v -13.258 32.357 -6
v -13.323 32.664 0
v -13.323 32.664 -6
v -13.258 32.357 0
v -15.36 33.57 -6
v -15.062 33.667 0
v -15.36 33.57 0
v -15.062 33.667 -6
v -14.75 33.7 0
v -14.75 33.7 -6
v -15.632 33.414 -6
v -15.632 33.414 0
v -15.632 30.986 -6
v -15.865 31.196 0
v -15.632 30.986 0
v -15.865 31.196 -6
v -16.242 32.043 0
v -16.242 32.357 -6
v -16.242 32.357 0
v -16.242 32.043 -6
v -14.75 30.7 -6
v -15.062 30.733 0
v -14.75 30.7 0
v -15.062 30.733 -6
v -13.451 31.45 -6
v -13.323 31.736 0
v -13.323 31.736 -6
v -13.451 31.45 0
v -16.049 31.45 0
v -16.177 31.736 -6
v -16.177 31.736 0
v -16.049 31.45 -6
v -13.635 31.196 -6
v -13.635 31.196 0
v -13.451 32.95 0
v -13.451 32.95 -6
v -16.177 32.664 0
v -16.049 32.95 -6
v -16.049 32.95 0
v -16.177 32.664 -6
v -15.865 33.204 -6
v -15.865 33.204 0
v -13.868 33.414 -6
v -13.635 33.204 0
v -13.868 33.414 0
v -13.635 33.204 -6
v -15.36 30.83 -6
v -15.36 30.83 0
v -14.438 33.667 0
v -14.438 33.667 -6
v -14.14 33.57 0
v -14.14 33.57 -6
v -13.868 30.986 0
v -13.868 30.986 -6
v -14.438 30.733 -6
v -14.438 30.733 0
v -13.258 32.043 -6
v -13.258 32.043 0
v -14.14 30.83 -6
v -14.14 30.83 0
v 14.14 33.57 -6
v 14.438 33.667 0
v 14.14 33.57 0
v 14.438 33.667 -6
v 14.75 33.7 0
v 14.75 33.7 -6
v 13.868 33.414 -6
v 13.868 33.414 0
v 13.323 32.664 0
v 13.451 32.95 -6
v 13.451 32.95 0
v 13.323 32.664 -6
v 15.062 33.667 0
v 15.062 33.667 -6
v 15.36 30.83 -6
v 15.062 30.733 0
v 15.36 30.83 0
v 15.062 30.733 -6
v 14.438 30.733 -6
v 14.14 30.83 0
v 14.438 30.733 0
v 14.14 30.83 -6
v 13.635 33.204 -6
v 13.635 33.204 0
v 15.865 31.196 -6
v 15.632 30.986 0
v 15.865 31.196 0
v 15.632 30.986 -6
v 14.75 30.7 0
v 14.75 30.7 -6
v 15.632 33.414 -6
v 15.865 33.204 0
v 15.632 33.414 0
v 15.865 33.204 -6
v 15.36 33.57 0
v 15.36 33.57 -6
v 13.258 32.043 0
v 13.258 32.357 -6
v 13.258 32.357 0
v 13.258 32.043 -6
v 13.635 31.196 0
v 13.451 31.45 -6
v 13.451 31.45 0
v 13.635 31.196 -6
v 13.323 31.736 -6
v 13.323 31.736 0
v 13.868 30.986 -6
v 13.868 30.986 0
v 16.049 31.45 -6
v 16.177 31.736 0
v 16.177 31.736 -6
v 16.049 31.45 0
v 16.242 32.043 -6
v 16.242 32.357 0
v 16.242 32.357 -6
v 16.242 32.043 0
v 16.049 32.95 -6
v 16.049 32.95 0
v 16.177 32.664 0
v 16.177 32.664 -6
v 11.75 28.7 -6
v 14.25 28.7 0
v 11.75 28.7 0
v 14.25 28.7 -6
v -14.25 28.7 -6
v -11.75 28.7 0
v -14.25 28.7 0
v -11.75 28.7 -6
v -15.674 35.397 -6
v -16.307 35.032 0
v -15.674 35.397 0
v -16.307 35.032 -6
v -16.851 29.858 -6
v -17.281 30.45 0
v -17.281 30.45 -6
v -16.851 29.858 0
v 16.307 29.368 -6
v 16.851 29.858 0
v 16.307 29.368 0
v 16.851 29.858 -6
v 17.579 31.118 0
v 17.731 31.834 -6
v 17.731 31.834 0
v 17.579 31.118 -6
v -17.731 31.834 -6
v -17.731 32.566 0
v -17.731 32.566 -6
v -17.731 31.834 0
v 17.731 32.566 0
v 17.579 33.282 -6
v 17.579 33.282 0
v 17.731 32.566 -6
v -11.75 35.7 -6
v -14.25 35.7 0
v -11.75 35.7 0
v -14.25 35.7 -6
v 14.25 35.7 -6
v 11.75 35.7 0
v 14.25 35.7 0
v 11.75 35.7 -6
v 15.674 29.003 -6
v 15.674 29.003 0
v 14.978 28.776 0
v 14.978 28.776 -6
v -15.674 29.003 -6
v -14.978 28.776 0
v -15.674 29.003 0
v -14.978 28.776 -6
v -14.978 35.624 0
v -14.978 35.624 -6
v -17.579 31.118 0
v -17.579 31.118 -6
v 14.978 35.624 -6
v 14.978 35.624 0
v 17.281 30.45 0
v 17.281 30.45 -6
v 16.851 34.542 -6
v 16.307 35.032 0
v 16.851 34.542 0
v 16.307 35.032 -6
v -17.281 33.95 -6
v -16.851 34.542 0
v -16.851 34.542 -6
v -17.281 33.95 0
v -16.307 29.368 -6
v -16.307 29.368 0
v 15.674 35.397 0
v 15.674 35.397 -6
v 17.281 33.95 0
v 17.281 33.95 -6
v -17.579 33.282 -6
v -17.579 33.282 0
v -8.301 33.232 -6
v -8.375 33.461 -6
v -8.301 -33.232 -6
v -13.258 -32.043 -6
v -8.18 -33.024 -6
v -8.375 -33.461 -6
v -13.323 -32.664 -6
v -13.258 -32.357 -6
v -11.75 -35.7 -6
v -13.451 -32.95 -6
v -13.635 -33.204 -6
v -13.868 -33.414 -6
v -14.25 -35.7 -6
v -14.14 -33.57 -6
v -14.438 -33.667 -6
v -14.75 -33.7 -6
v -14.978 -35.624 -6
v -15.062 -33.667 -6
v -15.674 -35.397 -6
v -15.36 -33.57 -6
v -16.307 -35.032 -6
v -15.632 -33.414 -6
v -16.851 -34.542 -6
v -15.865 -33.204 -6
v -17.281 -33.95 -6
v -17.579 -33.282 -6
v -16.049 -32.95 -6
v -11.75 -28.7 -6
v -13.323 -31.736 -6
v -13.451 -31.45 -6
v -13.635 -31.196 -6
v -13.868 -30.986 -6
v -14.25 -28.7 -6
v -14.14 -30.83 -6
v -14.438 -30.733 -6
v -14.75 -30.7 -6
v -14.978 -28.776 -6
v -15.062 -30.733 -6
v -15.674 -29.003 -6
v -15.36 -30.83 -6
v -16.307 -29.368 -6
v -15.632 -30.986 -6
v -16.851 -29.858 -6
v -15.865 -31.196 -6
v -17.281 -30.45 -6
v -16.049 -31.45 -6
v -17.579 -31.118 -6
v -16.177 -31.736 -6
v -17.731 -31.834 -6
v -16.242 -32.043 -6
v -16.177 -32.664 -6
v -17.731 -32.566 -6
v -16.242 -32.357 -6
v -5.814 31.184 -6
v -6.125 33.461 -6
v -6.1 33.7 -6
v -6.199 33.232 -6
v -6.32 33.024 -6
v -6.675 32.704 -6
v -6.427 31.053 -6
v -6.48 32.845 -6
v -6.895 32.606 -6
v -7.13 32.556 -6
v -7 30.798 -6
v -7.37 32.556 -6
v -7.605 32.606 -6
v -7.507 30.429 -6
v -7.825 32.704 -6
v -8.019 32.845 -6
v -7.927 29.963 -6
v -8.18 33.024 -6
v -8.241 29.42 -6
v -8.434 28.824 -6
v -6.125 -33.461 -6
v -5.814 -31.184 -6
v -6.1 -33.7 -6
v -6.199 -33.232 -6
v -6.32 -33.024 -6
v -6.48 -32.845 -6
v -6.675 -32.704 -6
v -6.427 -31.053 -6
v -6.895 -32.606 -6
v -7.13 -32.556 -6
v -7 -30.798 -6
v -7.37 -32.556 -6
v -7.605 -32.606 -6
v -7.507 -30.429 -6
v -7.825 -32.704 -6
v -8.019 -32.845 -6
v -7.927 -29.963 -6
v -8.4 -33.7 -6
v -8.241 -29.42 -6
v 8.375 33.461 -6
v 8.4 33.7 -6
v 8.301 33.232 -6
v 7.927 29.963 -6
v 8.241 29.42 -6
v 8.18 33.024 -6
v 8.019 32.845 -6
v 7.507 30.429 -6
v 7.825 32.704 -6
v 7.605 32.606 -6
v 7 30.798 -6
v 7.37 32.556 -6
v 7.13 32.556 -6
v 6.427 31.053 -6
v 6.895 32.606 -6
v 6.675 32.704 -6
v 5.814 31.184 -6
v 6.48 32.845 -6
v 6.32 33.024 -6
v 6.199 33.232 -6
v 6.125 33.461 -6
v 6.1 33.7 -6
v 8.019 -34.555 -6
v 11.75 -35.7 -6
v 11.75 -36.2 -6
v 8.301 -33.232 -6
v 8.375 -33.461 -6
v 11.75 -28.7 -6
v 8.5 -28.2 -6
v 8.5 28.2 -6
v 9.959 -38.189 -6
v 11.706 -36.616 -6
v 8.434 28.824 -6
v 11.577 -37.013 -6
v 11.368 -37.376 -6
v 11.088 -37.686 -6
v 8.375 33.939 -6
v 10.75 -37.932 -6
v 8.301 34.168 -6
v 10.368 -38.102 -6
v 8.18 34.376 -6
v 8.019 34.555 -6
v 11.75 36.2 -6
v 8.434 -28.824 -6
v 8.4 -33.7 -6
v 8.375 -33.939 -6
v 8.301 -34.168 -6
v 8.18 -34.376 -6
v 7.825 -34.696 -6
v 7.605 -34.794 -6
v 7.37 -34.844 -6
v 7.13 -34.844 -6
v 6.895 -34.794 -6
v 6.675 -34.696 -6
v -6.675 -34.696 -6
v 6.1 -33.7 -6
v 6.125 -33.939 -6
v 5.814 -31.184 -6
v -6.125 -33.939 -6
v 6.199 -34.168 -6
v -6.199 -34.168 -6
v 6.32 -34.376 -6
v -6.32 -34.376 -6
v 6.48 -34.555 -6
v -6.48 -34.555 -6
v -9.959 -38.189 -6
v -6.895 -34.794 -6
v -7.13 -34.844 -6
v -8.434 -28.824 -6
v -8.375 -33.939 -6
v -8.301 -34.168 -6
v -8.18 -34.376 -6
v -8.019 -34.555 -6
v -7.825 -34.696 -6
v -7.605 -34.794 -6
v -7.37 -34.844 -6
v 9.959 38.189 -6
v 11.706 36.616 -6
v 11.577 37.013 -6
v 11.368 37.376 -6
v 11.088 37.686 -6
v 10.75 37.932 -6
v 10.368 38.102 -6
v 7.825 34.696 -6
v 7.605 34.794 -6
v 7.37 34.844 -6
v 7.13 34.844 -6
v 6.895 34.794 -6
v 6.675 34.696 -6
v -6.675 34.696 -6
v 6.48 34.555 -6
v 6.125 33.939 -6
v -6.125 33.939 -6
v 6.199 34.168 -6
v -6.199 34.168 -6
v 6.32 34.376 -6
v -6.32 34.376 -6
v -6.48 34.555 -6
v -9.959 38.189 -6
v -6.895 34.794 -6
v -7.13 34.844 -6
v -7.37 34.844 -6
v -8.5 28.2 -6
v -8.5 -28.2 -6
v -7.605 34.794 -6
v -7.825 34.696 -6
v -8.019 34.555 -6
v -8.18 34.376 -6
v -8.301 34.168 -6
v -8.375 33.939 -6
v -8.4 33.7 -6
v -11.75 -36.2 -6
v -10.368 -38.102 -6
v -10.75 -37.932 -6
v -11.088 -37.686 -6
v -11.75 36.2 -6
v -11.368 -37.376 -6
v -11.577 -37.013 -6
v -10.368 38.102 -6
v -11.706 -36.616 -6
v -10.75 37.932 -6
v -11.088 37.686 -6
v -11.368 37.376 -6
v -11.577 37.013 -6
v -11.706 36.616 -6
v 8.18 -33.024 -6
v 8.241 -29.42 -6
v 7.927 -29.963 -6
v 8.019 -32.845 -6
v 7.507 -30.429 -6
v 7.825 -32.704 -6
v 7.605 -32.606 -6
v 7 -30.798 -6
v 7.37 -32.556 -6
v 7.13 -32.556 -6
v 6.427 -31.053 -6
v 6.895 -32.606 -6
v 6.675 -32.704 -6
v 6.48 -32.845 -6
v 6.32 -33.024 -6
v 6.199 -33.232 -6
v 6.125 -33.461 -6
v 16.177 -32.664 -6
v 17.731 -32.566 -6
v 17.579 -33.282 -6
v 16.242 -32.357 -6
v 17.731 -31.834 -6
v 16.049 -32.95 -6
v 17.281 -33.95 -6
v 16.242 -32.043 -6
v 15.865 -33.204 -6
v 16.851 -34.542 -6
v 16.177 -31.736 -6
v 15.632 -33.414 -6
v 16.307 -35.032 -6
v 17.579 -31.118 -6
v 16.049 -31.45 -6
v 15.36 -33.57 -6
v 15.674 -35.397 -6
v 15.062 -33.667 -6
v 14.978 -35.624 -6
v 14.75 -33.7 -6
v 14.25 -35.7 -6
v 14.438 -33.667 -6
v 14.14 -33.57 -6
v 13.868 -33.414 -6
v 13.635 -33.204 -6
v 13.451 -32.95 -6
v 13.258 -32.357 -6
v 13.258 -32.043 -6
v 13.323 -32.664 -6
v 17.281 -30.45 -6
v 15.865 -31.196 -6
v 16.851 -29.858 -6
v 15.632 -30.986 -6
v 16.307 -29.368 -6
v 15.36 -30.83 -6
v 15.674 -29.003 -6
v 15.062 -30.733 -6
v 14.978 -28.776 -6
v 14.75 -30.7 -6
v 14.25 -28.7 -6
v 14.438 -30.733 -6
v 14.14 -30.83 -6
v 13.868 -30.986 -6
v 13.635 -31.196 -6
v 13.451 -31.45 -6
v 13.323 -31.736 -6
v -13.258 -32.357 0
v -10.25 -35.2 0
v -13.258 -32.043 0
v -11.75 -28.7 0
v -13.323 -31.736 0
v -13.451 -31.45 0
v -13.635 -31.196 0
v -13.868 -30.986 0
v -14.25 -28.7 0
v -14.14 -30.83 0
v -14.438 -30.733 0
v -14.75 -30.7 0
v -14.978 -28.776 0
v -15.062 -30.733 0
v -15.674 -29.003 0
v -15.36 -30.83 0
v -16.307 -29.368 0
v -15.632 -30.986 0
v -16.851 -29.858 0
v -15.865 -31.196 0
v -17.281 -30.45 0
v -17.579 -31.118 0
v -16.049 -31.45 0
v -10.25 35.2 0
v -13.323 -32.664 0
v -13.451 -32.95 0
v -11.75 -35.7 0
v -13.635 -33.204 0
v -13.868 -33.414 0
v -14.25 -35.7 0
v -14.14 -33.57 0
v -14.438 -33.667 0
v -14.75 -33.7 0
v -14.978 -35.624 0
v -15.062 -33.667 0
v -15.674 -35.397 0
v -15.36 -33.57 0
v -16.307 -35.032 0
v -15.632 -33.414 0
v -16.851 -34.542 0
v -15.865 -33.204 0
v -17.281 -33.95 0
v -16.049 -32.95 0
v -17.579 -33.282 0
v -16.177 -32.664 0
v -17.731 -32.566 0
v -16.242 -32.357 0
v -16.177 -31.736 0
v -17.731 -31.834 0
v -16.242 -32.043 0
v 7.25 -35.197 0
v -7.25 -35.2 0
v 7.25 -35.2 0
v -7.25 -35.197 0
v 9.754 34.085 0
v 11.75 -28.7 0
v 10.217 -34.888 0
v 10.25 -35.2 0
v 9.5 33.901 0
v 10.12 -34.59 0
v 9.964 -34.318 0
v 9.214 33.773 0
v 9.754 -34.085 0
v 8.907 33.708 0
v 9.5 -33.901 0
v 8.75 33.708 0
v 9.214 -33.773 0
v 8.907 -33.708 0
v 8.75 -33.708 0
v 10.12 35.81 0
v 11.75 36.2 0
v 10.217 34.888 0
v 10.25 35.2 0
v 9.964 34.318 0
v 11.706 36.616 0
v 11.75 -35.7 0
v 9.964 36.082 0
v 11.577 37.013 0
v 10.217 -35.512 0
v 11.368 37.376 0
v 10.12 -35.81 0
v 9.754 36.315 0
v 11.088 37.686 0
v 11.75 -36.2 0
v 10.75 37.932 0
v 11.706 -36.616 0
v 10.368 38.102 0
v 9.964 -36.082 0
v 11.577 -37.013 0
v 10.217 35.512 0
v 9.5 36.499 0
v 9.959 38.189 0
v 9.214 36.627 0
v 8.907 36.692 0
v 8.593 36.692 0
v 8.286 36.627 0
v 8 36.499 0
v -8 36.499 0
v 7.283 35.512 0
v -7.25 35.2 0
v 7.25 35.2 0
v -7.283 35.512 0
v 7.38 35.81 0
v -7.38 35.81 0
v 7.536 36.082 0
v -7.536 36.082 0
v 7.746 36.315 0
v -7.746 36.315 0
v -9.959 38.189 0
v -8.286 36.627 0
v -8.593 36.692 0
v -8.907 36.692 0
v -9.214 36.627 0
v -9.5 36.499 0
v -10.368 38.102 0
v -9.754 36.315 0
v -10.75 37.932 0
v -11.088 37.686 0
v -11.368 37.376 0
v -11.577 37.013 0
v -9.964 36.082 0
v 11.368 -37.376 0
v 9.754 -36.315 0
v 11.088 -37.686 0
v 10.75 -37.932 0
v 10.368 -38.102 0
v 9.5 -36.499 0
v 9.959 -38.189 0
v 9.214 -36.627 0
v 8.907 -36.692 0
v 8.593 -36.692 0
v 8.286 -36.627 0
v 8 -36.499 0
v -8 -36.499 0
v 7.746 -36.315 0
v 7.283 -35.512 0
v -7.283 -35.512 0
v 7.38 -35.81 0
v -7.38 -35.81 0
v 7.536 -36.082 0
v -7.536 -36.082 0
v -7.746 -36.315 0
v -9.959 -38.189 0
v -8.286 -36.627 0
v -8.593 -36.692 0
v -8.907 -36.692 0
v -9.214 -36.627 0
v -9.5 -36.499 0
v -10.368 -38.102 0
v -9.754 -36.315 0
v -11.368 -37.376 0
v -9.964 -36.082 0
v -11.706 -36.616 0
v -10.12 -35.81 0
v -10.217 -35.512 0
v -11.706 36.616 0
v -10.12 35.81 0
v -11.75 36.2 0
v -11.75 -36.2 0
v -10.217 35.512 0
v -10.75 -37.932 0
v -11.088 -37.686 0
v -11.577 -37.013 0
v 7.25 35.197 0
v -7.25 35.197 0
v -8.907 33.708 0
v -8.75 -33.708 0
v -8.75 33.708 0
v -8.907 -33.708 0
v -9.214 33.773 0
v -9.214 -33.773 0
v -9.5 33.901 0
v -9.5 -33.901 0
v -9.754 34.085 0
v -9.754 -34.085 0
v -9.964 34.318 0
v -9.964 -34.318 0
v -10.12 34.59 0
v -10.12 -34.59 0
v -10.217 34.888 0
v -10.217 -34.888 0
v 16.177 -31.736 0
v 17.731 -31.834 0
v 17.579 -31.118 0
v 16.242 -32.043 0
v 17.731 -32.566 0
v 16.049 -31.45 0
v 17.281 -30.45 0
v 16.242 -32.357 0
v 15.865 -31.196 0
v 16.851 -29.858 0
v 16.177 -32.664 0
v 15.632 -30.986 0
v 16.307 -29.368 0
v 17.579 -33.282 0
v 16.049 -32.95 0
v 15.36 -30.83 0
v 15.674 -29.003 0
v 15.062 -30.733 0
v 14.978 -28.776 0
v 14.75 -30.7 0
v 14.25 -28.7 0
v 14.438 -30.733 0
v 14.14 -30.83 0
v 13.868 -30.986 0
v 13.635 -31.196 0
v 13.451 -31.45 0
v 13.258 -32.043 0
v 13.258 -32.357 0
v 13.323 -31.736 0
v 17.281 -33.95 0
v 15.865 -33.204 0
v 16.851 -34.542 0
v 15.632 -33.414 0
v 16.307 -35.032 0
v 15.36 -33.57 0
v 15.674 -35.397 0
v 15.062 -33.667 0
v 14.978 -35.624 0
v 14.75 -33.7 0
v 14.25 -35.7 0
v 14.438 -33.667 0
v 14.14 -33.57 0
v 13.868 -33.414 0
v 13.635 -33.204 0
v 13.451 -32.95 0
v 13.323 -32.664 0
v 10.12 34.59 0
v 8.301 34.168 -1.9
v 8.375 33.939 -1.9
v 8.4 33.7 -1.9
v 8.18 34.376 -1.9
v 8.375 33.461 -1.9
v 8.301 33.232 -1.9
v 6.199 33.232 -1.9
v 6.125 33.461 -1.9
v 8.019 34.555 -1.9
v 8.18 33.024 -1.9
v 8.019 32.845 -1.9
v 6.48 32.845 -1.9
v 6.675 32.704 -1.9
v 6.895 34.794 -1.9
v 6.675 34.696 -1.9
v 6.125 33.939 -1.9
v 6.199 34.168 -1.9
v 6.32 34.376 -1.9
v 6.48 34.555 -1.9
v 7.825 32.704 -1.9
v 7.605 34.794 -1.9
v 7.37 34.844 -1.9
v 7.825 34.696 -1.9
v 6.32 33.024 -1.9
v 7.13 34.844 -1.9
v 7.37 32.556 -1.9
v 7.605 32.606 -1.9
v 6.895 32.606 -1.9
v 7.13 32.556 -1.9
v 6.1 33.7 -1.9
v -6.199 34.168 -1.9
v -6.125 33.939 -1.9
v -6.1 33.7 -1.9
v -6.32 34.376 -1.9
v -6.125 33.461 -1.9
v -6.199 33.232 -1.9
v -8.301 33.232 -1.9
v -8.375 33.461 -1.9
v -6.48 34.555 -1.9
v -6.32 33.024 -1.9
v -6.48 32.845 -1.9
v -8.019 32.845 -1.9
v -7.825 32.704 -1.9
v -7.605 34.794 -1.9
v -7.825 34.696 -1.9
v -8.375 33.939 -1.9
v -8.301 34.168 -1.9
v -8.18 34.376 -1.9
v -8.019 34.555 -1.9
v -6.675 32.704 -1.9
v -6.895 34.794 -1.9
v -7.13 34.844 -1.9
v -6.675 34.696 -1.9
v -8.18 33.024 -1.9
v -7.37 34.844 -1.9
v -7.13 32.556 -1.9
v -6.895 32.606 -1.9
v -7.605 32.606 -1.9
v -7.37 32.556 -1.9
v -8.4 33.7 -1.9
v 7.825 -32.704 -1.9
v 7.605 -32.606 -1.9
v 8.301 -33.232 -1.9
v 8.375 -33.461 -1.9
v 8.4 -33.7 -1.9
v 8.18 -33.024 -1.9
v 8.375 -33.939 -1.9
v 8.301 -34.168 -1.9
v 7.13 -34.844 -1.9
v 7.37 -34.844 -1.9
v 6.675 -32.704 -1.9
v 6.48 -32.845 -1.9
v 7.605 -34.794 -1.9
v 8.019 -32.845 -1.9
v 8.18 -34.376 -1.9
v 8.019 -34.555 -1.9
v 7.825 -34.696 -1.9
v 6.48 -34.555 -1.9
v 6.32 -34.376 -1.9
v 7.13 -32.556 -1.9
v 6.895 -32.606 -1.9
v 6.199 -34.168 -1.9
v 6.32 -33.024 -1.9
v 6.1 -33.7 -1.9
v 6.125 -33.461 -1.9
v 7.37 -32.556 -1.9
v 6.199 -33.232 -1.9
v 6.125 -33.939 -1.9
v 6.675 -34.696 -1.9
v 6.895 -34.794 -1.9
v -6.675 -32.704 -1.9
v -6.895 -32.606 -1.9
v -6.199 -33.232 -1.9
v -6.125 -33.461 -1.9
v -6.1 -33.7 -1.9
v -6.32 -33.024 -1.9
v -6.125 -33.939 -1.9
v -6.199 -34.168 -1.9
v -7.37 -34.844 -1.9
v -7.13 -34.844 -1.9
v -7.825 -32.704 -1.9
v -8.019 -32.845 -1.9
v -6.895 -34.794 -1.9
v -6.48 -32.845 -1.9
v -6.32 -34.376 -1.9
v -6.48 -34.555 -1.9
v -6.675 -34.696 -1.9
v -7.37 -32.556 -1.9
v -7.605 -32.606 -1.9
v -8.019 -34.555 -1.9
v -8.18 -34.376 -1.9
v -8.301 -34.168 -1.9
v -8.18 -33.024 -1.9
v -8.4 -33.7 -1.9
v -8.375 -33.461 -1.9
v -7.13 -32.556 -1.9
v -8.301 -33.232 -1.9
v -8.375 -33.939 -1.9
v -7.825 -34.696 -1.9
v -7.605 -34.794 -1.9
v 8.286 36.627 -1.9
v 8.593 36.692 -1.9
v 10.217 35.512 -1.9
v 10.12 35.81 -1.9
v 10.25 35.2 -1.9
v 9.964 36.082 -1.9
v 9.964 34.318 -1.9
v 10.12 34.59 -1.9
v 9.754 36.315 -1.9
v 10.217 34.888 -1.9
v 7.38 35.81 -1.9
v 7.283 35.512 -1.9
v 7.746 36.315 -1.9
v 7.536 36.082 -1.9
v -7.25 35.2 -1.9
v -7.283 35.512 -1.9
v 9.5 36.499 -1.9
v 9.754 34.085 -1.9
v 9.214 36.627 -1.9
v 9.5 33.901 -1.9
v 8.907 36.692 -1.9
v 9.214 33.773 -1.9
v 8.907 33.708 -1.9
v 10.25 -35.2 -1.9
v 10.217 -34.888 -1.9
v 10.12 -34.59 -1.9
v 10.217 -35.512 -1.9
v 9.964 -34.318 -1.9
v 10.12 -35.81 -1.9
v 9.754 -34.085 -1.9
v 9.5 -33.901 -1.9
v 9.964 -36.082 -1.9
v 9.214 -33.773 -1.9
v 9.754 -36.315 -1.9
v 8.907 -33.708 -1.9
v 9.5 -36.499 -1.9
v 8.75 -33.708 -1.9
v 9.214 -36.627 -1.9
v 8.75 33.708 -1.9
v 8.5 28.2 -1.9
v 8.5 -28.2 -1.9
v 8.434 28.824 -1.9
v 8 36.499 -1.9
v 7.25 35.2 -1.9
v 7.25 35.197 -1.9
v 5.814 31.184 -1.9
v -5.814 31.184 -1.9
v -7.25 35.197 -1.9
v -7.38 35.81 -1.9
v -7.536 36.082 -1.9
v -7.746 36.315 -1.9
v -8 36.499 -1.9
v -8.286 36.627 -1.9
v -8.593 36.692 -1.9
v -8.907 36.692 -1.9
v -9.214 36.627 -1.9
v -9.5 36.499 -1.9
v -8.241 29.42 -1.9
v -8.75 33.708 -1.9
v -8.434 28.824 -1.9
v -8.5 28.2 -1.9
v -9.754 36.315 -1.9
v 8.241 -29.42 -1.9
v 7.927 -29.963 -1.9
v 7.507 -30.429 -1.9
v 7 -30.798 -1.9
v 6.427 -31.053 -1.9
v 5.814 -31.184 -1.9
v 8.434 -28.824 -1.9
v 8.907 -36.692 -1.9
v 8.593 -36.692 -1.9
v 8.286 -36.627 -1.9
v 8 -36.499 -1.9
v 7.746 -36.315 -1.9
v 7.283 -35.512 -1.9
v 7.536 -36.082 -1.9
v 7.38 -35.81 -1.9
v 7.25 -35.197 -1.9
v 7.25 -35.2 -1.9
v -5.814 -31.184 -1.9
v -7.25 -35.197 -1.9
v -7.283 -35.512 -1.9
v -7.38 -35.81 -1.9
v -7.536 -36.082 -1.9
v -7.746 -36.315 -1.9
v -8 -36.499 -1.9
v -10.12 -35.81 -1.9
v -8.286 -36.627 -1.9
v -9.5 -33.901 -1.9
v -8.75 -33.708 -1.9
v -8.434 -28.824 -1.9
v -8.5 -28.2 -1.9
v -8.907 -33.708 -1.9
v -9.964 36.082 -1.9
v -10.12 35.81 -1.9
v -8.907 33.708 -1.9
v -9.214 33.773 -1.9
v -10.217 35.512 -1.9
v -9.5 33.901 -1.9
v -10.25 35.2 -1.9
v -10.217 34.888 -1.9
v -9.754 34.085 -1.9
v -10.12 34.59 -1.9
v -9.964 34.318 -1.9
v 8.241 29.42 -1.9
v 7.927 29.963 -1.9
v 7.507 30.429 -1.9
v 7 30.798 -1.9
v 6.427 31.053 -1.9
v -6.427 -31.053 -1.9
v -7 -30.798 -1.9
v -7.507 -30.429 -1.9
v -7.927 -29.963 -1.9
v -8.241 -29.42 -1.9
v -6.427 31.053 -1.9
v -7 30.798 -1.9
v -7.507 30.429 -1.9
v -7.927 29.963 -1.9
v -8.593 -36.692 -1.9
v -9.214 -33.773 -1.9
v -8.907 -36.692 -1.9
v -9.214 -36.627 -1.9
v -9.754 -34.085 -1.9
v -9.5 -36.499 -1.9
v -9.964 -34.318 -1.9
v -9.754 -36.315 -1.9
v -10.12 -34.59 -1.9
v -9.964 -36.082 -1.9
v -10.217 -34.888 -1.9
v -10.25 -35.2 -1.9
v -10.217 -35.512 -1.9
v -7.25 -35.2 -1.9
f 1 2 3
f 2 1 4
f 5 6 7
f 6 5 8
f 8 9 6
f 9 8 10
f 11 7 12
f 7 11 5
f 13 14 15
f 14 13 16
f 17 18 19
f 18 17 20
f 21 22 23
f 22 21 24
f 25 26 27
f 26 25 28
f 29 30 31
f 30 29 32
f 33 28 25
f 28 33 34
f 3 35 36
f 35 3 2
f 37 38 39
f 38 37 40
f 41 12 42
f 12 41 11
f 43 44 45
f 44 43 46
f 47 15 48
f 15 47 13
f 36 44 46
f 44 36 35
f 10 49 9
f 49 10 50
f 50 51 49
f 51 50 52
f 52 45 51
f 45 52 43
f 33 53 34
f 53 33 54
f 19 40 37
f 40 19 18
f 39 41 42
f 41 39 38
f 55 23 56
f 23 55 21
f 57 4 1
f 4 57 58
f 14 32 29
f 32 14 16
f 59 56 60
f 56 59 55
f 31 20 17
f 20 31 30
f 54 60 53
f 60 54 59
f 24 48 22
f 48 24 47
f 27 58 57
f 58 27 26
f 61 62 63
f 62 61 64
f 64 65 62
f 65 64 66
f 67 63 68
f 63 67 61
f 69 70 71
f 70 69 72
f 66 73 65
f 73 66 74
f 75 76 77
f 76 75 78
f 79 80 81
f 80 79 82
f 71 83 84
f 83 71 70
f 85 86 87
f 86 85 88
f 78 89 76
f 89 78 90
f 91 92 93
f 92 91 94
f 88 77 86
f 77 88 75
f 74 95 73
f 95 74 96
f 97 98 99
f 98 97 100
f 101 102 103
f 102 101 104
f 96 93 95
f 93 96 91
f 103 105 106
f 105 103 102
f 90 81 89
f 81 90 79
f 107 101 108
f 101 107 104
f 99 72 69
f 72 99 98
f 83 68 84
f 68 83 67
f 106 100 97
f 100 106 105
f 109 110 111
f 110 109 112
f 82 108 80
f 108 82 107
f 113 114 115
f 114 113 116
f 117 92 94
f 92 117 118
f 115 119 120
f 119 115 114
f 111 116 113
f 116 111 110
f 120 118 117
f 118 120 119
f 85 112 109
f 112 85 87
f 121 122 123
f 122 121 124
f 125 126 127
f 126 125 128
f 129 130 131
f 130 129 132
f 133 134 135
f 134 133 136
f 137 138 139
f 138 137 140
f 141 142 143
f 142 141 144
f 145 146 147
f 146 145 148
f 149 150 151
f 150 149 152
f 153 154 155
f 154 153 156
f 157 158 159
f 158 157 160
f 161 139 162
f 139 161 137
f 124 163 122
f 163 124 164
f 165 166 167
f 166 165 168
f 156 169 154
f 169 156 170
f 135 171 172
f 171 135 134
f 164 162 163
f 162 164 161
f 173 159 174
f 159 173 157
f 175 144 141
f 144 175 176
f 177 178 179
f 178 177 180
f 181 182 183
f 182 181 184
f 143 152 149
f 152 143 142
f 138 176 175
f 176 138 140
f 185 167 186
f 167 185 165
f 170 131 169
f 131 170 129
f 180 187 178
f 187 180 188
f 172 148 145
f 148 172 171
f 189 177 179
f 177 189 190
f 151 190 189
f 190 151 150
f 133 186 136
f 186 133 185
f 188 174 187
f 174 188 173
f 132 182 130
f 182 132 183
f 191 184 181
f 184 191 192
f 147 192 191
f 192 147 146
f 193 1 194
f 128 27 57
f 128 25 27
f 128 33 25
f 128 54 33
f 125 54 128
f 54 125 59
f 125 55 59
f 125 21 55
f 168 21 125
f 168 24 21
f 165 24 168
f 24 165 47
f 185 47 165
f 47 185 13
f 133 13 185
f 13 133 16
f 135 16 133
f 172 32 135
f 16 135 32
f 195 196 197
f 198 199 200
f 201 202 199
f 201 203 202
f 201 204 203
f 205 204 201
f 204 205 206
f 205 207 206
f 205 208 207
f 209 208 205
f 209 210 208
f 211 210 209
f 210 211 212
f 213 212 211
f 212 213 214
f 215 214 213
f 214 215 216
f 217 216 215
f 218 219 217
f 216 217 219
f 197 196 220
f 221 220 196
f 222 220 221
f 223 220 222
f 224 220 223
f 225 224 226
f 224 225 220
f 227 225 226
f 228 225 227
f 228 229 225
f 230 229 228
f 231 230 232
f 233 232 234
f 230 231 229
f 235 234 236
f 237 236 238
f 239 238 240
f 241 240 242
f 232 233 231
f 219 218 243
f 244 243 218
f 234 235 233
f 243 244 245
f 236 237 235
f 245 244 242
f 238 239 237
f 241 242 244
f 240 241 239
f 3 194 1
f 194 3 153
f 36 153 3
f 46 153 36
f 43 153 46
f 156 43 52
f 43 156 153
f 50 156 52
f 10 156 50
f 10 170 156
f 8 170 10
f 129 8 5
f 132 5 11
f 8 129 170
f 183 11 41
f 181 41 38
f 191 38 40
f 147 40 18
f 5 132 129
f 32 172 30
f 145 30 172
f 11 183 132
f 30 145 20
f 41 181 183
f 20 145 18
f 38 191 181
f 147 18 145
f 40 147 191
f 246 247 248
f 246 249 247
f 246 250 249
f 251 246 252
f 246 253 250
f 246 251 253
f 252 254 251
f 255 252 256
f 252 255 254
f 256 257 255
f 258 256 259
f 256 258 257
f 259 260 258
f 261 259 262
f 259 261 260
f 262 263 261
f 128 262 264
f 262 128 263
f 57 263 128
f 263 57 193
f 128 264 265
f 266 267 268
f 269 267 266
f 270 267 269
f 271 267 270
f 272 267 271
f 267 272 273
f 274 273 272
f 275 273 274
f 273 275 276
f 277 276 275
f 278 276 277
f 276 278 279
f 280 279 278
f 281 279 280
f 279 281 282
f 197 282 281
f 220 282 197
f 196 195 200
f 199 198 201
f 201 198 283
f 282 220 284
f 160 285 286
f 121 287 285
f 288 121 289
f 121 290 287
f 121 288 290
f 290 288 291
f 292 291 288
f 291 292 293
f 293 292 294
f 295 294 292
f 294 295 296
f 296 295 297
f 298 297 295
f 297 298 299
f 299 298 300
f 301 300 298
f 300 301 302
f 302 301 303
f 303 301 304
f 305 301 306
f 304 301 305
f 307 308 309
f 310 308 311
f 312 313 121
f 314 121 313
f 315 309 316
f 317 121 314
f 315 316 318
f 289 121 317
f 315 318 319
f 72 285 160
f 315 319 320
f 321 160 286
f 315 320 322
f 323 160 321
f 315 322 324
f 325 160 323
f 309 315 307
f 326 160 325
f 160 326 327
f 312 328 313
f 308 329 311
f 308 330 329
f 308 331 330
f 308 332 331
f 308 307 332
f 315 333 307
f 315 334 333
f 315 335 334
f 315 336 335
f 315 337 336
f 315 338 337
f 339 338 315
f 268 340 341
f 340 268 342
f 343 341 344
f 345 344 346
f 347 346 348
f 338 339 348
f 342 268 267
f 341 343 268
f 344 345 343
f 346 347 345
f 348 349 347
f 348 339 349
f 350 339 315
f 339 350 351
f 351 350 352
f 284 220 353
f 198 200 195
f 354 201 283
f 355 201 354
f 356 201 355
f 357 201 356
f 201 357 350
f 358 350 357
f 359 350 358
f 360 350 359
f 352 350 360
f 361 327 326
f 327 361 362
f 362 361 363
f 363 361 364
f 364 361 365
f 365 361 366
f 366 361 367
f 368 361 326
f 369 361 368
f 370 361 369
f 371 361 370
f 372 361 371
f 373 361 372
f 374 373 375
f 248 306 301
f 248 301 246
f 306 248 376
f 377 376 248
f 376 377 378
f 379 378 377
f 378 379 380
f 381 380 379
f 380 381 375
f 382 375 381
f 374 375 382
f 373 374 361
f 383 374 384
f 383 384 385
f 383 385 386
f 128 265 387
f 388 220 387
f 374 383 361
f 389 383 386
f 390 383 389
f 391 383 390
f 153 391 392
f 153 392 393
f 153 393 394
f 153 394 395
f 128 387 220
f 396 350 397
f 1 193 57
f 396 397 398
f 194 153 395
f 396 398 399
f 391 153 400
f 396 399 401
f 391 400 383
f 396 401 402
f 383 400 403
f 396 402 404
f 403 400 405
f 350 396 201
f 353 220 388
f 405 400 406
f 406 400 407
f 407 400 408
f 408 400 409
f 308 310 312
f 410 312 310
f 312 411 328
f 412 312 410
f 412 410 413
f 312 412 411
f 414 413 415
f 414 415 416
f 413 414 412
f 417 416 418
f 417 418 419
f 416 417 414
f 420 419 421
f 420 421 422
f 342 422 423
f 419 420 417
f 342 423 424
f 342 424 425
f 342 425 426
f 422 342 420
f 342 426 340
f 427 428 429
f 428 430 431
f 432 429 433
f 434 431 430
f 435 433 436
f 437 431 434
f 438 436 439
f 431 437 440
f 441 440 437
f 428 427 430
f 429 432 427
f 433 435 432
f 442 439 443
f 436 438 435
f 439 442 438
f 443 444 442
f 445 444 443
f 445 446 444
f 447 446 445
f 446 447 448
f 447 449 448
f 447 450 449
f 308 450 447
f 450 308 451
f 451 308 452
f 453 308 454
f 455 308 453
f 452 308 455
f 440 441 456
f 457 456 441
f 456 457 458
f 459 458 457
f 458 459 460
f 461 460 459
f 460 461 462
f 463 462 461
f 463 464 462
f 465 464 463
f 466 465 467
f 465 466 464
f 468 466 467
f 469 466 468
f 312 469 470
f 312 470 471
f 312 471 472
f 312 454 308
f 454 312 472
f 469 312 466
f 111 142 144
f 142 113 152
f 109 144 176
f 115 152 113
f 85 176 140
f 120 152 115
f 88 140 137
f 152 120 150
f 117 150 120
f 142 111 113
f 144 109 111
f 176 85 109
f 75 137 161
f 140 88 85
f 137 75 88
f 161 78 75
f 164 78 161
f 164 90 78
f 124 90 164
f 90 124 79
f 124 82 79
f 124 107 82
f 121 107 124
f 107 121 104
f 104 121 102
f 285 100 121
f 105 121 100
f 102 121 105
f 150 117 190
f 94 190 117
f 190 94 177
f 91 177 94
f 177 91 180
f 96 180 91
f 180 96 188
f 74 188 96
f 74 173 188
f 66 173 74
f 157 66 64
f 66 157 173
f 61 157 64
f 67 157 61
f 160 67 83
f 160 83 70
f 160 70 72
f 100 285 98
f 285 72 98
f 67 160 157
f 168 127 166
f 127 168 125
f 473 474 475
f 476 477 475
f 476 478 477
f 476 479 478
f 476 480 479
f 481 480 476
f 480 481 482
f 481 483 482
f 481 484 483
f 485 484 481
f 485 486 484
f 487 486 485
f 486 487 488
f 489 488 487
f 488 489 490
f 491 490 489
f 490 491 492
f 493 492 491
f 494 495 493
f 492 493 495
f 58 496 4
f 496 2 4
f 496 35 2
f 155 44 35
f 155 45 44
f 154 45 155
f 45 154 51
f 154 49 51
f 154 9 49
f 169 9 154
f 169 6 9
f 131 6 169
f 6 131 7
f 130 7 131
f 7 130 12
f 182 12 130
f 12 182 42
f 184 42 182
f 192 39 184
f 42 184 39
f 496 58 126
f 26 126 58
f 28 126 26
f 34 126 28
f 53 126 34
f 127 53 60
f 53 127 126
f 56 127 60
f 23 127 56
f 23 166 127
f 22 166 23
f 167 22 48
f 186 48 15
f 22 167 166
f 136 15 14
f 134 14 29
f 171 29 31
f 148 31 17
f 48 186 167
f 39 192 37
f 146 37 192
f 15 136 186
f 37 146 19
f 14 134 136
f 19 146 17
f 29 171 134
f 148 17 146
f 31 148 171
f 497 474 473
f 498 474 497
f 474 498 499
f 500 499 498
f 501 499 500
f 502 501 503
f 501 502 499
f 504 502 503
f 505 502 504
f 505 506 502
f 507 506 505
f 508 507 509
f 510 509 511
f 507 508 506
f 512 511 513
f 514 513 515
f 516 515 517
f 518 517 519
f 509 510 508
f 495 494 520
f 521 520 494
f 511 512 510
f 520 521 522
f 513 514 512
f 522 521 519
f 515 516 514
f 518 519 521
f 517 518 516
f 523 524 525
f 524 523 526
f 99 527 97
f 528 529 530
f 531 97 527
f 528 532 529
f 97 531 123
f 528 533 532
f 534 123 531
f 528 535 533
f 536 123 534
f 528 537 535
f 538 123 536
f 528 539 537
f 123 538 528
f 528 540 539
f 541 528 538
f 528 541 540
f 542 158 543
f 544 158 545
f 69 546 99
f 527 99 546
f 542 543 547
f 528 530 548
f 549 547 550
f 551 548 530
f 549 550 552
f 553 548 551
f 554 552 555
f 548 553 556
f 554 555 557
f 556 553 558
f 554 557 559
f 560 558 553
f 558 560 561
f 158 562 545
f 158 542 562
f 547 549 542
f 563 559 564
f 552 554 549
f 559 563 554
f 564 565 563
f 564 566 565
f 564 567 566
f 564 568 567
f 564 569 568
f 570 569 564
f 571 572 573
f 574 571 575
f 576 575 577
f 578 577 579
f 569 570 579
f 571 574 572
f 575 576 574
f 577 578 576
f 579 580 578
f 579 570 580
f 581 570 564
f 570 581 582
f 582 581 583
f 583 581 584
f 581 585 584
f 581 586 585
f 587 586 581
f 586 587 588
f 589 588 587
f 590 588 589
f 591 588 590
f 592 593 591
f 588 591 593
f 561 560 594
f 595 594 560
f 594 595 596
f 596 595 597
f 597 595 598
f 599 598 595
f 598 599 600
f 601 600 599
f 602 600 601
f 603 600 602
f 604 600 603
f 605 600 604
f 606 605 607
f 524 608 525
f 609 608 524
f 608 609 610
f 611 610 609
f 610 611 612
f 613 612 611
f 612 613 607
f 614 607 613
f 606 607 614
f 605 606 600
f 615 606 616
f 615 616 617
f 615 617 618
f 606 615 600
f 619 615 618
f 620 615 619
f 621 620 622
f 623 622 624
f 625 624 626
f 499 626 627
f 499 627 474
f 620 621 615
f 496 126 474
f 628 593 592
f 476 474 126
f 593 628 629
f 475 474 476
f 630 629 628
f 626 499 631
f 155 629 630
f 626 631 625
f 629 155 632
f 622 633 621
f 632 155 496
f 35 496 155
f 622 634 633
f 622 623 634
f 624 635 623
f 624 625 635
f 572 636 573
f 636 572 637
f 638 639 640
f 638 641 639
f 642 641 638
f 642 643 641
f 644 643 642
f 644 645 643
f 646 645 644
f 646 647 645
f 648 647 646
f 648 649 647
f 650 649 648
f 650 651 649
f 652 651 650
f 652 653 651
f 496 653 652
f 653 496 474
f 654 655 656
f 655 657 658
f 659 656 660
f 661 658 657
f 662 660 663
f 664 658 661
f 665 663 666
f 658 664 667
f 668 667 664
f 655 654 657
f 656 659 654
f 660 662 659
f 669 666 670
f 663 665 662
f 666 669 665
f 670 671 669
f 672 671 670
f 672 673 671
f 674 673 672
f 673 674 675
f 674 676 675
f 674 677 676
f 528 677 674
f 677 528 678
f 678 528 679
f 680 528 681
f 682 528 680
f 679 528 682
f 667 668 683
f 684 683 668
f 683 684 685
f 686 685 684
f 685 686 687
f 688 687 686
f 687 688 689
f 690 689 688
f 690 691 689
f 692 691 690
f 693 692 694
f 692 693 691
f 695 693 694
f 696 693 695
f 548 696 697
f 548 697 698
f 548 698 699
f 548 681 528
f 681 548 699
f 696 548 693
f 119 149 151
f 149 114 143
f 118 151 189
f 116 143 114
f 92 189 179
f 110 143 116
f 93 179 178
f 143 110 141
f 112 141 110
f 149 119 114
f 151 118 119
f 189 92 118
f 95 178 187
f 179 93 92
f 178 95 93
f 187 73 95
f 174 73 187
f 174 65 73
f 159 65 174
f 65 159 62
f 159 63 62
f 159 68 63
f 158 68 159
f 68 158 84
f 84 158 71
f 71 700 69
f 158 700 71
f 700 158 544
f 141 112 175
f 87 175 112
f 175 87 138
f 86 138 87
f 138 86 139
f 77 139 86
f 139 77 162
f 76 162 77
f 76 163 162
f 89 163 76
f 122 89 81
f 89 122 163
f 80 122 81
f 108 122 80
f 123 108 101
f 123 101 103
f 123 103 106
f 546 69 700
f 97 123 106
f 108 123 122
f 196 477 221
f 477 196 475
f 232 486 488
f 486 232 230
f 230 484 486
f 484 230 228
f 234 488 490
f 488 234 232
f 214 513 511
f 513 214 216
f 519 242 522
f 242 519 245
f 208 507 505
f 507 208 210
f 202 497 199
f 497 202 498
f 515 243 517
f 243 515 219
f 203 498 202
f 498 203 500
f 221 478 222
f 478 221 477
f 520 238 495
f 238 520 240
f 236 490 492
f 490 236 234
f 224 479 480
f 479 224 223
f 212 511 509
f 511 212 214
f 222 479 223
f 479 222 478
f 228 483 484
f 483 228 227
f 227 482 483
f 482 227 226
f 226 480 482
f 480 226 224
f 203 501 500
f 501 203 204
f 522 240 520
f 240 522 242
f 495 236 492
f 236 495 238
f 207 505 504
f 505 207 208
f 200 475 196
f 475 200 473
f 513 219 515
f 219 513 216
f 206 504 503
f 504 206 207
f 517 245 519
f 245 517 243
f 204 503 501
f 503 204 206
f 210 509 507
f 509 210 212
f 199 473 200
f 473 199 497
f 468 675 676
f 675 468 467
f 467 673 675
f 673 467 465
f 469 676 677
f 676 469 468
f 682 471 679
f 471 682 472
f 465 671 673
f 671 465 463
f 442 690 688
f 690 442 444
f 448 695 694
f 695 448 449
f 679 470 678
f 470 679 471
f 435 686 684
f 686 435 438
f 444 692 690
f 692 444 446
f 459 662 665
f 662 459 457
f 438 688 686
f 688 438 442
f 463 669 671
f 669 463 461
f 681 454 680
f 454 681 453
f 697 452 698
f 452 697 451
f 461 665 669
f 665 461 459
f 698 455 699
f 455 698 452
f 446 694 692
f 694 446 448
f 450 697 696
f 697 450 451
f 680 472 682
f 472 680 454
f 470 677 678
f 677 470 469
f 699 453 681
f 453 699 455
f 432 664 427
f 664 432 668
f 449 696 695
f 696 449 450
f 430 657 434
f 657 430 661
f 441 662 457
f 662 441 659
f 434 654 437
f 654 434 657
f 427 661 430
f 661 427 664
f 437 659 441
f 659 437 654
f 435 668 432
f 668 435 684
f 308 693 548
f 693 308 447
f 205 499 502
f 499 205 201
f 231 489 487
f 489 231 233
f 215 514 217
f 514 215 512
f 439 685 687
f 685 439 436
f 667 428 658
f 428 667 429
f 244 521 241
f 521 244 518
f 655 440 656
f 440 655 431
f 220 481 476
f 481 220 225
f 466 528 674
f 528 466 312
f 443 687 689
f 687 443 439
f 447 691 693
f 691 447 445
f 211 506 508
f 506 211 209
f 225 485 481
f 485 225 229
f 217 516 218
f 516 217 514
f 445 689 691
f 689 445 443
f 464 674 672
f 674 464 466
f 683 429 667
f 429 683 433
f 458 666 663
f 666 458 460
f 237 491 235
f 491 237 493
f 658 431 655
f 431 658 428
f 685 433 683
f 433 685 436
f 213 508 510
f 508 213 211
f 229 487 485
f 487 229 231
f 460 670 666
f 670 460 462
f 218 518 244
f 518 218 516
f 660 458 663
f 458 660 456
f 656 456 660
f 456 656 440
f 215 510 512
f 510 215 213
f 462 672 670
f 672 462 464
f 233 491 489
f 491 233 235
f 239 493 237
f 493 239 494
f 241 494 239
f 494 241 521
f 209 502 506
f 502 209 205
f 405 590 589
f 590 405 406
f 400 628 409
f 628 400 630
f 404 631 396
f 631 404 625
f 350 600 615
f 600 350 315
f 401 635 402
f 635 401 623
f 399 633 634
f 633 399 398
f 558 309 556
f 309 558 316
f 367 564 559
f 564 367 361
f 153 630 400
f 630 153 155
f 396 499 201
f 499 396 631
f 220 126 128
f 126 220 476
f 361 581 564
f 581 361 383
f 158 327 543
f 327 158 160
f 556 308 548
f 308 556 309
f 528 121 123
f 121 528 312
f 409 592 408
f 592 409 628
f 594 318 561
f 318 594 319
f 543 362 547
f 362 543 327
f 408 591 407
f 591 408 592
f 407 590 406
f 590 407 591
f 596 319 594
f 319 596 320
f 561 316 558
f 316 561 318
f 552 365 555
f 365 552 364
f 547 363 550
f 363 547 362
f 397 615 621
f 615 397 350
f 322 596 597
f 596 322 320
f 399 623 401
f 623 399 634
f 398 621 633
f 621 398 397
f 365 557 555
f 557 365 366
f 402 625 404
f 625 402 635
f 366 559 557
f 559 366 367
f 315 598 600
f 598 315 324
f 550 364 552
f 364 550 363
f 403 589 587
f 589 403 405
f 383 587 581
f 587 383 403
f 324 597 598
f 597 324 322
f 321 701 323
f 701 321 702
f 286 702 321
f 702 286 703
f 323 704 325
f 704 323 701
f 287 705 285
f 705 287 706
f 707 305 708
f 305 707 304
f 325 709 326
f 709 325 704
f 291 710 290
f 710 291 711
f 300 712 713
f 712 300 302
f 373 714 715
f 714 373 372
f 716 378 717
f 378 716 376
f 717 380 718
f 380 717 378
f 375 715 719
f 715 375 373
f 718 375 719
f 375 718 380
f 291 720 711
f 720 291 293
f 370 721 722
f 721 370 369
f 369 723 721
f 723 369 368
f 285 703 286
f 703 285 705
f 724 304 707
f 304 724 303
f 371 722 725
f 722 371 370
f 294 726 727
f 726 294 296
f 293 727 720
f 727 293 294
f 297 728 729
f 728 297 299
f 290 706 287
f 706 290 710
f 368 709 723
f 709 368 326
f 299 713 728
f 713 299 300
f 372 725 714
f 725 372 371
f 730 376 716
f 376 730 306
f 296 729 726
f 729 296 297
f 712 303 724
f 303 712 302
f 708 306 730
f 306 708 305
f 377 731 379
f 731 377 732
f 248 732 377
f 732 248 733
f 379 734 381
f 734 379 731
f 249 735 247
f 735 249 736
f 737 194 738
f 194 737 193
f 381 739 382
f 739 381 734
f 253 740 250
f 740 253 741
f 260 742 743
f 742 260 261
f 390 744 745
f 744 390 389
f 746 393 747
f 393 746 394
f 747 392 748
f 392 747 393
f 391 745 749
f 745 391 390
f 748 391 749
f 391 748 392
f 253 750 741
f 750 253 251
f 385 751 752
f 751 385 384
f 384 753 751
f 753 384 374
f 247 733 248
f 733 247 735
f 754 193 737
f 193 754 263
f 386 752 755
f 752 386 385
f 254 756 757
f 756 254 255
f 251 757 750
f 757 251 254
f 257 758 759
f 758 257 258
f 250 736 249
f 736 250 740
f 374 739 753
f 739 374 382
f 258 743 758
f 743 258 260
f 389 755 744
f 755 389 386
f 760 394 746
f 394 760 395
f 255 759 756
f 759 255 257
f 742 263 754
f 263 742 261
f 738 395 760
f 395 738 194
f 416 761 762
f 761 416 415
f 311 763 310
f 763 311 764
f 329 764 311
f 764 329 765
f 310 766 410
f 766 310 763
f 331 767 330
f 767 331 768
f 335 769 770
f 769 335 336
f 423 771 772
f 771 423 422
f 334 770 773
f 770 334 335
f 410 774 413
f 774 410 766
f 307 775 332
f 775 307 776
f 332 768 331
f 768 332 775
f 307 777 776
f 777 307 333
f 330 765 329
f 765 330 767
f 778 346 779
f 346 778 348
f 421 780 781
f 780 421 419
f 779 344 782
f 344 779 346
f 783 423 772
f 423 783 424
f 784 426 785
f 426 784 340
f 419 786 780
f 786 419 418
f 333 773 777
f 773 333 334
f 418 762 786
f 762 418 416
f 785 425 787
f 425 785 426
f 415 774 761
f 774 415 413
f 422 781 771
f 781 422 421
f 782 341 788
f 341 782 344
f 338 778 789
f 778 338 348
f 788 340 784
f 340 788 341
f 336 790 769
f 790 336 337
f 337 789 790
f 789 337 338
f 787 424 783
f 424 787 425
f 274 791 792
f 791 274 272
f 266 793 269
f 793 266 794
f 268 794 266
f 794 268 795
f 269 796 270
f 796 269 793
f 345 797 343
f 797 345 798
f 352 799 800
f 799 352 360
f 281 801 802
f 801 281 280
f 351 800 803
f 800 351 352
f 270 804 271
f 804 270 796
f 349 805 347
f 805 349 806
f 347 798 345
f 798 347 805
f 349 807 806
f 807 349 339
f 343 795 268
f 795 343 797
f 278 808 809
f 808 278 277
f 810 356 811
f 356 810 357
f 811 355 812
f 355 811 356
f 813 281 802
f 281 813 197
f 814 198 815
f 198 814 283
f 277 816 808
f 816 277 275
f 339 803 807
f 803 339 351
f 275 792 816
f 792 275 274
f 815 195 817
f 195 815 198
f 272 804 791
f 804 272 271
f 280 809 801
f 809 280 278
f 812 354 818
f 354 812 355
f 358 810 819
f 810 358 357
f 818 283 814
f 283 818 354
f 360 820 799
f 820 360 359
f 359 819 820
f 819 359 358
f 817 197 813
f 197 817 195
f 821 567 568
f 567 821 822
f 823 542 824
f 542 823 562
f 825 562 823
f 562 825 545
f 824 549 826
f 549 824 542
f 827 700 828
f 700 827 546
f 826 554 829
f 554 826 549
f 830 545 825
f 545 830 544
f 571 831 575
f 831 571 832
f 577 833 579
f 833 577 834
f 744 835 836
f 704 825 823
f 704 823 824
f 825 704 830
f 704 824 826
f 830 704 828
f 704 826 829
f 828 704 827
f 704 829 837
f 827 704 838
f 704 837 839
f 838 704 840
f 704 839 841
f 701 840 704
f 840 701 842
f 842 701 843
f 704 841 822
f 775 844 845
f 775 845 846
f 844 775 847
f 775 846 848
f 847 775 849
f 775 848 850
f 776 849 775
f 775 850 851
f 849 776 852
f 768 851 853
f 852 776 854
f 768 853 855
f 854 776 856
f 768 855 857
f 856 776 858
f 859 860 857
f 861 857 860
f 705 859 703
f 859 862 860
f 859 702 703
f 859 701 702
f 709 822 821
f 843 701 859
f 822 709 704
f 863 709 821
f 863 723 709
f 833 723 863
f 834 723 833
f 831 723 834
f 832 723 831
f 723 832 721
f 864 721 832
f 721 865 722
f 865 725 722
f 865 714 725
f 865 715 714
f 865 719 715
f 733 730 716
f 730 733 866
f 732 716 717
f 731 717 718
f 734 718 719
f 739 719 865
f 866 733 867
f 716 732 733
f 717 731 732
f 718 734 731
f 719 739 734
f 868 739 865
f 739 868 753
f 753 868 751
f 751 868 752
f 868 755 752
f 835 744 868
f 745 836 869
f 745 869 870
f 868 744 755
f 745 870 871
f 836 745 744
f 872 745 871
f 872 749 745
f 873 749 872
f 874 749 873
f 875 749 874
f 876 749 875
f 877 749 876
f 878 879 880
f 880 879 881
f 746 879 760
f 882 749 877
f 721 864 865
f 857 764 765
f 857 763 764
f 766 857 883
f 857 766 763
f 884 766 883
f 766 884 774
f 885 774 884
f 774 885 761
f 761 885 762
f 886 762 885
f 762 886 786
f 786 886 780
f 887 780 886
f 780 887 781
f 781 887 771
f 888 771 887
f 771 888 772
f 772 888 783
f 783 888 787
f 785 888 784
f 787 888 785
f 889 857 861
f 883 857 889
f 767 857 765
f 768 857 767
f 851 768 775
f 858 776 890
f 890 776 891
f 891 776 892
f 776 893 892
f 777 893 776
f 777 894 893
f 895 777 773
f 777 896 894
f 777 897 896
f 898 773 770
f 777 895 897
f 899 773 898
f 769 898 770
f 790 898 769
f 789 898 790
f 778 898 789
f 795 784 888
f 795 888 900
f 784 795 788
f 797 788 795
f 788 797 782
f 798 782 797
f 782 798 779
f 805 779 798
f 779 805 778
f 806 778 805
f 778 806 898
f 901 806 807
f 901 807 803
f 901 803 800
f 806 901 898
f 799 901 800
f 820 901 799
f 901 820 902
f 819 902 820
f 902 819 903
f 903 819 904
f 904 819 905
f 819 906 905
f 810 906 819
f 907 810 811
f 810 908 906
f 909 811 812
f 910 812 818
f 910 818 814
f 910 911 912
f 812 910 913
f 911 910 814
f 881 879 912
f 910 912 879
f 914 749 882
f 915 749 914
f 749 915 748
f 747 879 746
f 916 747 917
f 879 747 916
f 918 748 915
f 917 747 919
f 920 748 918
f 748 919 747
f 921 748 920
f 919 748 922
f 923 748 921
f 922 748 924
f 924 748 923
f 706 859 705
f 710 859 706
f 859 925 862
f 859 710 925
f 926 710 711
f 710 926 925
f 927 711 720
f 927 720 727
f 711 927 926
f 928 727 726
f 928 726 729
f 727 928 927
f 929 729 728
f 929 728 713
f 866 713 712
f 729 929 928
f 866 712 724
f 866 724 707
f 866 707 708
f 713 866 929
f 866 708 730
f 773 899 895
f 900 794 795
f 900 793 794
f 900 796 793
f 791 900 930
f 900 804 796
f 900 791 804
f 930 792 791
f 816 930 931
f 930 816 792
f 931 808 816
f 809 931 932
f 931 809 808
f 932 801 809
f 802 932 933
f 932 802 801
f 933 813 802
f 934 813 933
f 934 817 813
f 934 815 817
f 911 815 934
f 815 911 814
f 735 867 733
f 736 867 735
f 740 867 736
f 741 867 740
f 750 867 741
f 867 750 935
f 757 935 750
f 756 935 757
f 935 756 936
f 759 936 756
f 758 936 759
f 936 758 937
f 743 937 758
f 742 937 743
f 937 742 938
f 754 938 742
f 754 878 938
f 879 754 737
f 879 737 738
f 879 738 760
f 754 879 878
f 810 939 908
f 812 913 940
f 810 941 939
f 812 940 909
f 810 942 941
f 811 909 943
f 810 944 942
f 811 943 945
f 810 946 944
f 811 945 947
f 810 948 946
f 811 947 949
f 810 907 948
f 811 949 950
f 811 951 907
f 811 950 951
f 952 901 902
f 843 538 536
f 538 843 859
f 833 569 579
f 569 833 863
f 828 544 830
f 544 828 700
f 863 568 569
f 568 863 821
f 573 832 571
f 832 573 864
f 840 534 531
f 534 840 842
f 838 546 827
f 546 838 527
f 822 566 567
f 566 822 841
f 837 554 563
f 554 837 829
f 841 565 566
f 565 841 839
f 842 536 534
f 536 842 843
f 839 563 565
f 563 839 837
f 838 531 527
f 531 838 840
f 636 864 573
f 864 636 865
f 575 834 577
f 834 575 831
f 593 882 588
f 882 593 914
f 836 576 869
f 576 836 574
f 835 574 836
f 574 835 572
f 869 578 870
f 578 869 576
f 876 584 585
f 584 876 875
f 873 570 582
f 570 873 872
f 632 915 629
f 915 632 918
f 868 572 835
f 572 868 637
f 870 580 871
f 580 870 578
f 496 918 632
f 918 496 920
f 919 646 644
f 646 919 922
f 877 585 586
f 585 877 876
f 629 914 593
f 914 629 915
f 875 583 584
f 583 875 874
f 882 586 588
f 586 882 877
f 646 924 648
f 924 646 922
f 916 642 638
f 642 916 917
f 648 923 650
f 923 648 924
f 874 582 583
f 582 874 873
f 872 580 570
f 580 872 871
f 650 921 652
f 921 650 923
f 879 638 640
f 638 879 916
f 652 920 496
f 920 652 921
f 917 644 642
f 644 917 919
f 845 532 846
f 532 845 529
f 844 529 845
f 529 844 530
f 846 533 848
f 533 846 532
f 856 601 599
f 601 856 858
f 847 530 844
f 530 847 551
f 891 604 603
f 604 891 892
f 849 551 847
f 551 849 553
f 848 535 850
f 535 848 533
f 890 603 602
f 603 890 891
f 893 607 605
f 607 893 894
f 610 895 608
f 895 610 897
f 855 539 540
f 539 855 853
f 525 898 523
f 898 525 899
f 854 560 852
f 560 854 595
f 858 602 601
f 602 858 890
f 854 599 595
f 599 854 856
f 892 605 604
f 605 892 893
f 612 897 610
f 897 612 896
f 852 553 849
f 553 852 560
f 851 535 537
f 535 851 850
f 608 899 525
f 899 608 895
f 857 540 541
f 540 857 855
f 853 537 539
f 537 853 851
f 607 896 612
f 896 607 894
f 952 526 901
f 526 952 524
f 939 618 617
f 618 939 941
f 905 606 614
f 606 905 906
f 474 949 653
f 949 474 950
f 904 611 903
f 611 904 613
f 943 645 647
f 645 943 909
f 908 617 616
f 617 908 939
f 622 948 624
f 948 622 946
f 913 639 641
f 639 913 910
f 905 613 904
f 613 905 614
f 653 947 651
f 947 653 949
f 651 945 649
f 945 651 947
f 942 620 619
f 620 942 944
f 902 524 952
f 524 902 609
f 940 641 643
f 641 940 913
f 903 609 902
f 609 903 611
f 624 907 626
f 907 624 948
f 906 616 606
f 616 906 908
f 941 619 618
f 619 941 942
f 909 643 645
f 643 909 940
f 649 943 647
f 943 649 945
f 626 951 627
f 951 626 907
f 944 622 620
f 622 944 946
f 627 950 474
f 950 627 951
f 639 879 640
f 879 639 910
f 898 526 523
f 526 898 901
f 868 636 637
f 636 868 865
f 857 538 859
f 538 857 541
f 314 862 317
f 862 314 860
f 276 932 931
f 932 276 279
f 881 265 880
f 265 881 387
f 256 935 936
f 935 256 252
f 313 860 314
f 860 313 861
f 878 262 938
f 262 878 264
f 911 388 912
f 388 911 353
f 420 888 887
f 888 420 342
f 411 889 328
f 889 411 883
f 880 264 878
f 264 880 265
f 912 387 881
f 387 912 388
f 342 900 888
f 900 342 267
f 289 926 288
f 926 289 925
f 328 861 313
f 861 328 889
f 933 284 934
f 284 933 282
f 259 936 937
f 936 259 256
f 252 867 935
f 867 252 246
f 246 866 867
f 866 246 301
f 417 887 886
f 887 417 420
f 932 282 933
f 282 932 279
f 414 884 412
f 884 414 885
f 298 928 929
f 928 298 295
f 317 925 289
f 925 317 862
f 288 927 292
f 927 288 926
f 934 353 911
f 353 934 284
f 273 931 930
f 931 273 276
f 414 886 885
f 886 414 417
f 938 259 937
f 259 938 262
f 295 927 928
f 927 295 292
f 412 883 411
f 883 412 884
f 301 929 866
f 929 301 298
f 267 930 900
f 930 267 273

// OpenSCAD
$fn=30;

boardDepth = 70.4;
boardWidth = 17.5;
boardHeigth = 10;

boardThickness = 2;

boardHoleDepth = boardDepth - 3; //1.85;
boardHoleWidth = boardWidth - 3; //1.85;
boardHolediamiter = 2.5;

baseDepth = boardDepth + 6;
baseWidth = boardWidth + 6;
baseHeigth = boardThickness + 4;

basedHoleDiamiter = 3;

baseCornerDiameter = 4;

//% board();

translate([0,0,-baseHeigth/2])
	base();
//feet();


////////////////////////////////////////////////////////////////////////////////////////////////////
module board(){
	difference(){
		plate4Point(boardWidth,boardDepth,boardThickness,1);
		for(a=[[1,1],[-1,1],[1,-1],[-1,-1]]){
			translate([
				a[0] * boardHoleWidth/2,
				a[1] * boardHoleDepth/2,
				0
			])
				cylinder(h=5,center=true);
		}
	}
}
////////////////////////////////////////////////////////////////////////////////////////////////////
module base(){

	difference(){
		// 
		union(){
			plate4Point(baseWidth,baseDepth,baseHeigth,4);
			rotate([0,0,90]) 
				feet();
		}
		for(a=[[1,1],[-1,1],[1,-1],[-1,-1]]){ // board mounting holes
			translate([
				a[0] * boardHoleWidth/2,
				a[1] * boardHoleDepth/2,
				0
			])
				cylinder(h=baseHeigth+5,d=boardHolediamiter-.2,center=true);
		}
		// Board cut out
		translate([0,0,baseHeigth-(boardThickness*2)+.1]) 
			plate4Point(
				boardWidth,
				boardDepth,
				boardThickness,1);
		for(a=[[1, 1],[-1, 1],[1, -1],[-1, -1]]){
			translate([(boardWidth/2)*a[0], (boardDepth/2)*a[1], baseHeigth-(boardThickness*2)+.1])
				cylinder(h=boardThickness,d=3,center=true);
		}
		// center cutout
		plate4Point(boardWidth-.5,boardDepth-8,10,6);
		
	}

}
////////////////////////////////////////////////////////////////////////////////////////////////////
module feet(){
	
	lenAdd = 12;
	footLen = baseWidth + lenAdd;
	
 for(a=[1, -1]){
	translate([a*((baseDepth/2)-5) - a, 0, 0]) 
		difference(){
			plate2Point(footLen, baseHeigth,7);
			for(b=[1,-1]){
				translate([0, b*(footLen/2) - b*3, 0])
					cylinder(h=baseHeigth+5,d=basedHoleDiamiter,center=true);
			}
		}
	}
}
////////////////////////////////////////////////////////////////////////////////////////////////////
module plate4Point(x,y,z,d){
	hull(){
		color("green") translate([(x/2)-(d/2) ,(y/2) -(d/2),0]) cylinder(h=z, d=d, center=true);
		color("blue")  translate([(x/2)-(d/2) ,-(y/2)+(d/2),0]) cylinder(h=z, d=d, center=true);
		color("red")   translate([-(x/2)+(d/2),(y/2) -(d/2),0]) cylinder(h=z, d=d, center=true);
		color("grey")  translate([-(x/2)+(d/2),-(y/2)+(d/2),0]) cylinder(h=z, d=d, center=true);
	}
}
////////////////////////////////////////////////////////////////////////////////////////////////////
module plate2Point(y,z,d){
	hull(){
		color("green") translate([0 ,(y/2) -(d/2),0]) cylinder(h=z, d=d, center=true);
		color("blue")  translate([0 ,-(y/2)+(d/2),0]) cylinder(h=z, d=d, center=true);
	}
}
